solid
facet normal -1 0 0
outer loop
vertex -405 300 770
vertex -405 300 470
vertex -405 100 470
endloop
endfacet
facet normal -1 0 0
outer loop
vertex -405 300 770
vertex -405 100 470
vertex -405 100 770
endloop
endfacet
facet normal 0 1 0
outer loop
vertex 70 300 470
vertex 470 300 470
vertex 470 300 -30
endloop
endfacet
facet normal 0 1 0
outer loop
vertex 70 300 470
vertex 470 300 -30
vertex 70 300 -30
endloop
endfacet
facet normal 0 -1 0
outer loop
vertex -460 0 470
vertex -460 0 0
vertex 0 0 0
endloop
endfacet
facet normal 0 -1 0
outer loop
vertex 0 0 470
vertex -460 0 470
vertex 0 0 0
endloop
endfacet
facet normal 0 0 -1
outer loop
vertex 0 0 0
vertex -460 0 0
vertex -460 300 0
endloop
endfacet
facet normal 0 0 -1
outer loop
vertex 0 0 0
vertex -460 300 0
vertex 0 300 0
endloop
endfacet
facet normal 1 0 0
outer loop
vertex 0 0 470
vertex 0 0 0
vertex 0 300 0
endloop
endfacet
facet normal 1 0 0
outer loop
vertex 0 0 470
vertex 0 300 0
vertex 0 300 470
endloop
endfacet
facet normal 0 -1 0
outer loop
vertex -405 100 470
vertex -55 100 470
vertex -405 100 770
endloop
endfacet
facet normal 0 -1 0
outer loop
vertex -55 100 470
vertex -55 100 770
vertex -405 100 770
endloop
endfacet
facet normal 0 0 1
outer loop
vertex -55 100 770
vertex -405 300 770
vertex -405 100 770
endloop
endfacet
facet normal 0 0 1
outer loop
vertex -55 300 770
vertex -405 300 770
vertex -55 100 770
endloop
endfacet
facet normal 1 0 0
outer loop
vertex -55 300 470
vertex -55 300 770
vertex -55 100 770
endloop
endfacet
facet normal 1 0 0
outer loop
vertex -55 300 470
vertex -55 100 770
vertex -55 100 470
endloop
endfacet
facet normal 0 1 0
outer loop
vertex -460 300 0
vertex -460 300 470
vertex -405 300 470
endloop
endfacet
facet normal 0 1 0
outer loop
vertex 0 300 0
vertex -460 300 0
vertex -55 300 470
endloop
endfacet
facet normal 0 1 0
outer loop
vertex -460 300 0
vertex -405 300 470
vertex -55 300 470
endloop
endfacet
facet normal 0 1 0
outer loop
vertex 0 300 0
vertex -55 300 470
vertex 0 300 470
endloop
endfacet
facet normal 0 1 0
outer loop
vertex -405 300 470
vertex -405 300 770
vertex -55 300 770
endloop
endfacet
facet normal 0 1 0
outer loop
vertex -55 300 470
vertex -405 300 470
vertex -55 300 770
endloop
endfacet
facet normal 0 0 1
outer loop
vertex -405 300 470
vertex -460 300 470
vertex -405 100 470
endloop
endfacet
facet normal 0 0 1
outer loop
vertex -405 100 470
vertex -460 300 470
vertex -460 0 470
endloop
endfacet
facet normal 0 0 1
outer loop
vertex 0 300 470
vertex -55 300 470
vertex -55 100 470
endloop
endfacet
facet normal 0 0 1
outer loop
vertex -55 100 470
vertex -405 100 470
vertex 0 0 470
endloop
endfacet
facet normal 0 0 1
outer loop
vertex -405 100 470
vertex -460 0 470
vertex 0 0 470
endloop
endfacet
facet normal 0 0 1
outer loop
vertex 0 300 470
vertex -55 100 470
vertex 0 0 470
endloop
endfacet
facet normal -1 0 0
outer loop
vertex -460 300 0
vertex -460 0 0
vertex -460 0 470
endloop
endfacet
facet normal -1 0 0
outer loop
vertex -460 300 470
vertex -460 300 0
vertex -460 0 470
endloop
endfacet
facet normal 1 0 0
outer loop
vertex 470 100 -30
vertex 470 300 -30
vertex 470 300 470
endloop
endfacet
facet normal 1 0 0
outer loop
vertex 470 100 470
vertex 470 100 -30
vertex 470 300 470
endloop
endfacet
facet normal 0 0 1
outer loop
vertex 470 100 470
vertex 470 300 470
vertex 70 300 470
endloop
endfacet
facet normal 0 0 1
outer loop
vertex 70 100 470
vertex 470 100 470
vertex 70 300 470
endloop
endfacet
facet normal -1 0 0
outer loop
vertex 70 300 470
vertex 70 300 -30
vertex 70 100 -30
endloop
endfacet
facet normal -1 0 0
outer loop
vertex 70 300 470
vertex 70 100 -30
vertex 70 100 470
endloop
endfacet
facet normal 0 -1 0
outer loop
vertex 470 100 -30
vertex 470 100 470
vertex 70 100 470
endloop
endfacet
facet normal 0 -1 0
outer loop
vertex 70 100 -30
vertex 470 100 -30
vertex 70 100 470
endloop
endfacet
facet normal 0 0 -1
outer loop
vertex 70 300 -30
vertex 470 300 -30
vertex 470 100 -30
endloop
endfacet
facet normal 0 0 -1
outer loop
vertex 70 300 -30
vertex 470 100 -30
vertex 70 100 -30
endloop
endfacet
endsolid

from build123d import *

# Parameters (mm, degrees)
F0_W     = 460
F0_H     = 470
F1_DEPTH = 300
F2_W     = 400
F2_H     = 500
F3_DEPTH = 200


with BuildPart() as f1:
    # F0 (on Front) → F1 (new body)
    with BuildSketch(Plane.XZ):
        with Locations((-230, 235)):
            Rectangle(F0_W, F0_H)
    extrude(amount=-F1_DEPTH)

    # F2 (on face) → F3 (join)
    with BuildSketch(Plane(origin=(0, 300, 0), x_dir=(-1, 0, 0), z_dir=(0, 1, 0))):
        Polygon((55, 470), (230, 470), (405, 470), (405, 770), (55, 770), align=None)
        with Locations((-270, 220)):
            Rectangle(F2_W, F2_H)
    extrude(amount=-F3_DEPTH)


solid = f1.part
